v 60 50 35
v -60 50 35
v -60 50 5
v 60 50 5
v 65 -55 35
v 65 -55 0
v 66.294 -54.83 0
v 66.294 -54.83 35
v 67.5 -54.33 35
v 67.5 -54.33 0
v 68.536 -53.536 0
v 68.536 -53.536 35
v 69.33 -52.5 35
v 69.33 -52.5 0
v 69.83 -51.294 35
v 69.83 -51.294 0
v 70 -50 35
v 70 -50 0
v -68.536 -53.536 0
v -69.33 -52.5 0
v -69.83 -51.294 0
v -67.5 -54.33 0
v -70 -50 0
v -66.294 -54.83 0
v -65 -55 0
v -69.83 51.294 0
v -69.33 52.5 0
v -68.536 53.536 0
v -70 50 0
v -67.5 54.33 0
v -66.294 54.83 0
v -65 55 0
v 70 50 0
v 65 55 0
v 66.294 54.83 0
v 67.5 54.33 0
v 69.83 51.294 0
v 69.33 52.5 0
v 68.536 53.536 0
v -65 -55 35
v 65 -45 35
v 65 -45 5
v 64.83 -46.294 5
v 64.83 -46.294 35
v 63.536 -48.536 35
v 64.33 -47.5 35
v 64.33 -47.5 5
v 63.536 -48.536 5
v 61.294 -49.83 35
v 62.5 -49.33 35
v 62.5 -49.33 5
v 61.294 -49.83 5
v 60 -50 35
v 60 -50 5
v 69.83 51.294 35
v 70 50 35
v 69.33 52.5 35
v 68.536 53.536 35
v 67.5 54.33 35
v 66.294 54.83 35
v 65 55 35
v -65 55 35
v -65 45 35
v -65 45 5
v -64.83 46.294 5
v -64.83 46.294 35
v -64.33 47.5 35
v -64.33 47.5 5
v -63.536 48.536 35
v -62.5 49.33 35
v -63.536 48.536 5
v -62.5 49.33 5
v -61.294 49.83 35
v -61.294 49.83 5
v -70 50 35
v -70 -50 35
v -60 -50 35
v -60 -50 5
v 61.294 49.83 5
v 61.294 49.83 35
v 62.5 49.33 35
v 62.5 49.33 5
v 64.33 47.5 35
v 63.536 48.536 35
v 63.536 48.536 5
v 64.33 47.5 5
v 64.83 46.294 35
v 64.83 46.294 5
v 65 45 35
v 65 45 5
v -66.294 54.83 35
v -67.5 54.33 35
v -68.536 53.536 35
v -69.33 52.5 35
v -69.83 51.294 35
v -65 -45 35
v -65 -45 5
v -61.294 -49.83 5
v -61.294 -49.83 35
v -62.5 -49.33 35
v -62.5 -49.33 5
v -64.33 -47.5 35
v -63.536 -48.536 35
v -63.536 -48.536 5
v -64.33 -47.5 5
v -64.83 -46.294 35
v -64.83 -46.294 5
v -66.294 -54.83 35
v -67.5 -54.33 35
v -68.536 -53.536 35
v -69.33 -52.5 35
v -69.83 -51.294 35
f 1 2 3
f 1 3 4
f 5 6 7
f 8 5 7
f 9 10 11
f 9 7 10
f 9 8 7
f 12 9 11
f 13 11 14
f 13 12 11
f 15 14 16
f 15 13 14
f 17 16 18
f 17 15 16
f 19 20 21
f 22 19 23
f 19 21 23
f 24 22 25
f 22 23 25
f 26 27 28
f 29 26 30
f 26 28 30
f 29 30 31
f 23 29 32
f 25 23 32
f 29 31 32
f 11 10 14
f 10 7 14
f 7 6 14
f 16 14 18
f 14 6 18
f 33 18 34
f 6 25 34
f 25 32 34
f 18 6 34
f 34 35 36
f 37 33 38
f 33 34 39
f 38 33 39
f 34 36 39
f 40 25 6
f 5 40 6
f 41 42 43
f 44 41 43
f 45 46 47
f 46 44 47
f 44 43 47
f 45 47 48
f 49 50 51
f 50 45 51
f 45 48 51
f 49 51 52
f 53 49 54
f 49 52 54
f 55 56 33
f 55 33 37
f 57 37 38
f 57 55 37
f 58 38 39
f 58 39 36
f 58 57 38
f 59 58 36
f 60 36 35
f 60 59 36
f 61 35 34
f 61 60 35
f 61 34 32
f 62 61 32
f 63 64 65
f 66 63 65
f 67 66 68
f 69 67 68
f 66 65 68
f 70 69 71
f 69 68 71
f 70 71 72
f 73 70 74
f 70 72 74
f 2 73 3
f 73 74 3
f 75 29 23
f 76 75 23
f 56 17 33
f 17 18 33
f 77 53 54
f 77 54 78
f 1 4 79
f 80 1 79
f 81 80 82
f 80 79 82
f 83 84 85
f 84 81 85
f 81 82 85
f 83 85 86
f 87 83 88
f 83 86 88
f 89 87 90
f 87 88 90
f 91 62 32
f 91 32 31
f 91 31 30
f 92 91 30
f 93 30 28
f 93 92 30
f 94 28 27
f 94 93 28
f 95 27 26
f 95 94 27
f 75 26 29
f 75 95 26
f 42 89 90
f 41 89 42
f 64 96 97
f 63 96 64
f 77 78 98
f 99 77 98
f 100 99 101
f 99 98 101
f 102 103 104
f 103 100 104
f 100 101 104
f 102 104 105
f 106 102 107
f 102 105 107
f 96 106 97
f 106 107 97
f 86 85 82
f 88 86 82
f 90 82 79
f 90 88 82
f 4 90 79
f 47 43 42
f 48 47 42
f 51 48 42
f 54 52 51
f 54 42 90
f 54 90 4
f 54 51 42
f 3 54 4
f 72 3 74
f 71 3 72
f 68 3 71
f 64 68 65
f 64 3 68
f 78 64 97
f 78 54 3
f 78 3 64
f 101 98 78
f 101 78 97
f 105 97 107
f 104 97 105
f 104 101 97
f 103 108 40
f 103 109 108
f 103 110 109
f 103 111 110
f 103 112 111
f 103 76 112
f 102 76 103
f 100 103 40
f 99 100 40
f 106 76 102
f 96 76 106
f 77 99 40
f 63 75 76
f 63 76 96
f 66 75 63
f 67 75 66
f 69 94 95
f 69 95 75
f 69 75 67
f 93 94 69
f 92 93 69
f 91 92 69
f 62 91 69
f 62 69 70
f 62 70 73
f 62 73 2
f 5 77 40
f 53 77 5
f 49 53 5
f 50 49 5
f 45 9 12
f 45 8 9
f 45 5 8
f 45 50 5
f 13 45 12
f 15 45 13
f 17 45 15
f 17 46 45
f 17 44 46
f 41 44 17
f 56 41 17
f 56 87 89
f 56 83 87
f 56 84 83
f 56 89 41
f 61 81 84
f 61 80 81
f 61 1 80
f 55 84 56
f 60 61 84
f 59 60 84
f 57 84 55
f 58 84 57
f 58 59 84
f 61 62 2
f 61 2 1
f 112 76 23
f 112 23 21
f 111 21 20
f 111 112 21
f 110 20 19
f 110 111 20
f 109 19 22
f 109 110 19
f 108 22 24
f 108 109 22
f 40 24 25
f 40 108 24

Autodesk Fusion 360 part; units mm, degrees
sketch "Sketch1" plane through (0, 0, 0) normal (0, 0, 1) x (1, 0, 0) in component "Component"
  line L0 (70, 55) -> (-70, 55)
  line L1 (-70, 55) -> (-70, -55)
  line L2 (-70, -55) -> (70, -55)
  line L3 (70, -55) -> (70, 55)
  line L4 (70, 55) -> (-70, -55) construction
  line L5 (-70, 55) -> (70, -55) construction
  dimension "d1" = 140
  dimension "d2" = 110
extrude "Extrude1" add sketch "Sketch1" along normal blind 35 in component "Component"
sketch "Sketch3" plane through (0, 0, 35) normal (0, 0, 1) x (-1, 0, 0) in component "Component"
  line L0 (-70, 55) -> (-70, -55)
  line L1 (-70, -55) -> (70, -55)
  line L2 (70, -55) -> (70, 55)
  line L3 (70, 55) -> (-70, 55)
  line L4 (65, -50) -> (-65, -50)
  line L5 (-65, -50) -> (-65, 50)
  line L6 (-65, 50) -> (65, 50)
  line L7 (65, 50) -> (65, -50)
  line L8 (65, -50) -> (-65, 50) construction
  line L9 (-65, -50) -> (65, 50) construction
  dimension "d5" = 130
  dimension "d6" = 100
extrude "Extrude2" cut sketch "Sketch3" against normal up to surface (30 mm away) contours L4 L5 L6 L7 in component "Component"
fillet "Fillet1" radius 5 4 edges at (65, -50, 20) (65, 50, 20) (-65, 50, 20) (-65, -50, 20) in component "Component"
fillet "Fillet2" radius 5 4 edges at (-70, 55, 17.5) (-70, -55, 17.5) (70, -55, 17.5) (70, 55, 17.5) in component "Component"
component "Component" placed x (1, 0, 0) y (0, 1, 0) z (0, 0, 1) at (0, 0, 0)
